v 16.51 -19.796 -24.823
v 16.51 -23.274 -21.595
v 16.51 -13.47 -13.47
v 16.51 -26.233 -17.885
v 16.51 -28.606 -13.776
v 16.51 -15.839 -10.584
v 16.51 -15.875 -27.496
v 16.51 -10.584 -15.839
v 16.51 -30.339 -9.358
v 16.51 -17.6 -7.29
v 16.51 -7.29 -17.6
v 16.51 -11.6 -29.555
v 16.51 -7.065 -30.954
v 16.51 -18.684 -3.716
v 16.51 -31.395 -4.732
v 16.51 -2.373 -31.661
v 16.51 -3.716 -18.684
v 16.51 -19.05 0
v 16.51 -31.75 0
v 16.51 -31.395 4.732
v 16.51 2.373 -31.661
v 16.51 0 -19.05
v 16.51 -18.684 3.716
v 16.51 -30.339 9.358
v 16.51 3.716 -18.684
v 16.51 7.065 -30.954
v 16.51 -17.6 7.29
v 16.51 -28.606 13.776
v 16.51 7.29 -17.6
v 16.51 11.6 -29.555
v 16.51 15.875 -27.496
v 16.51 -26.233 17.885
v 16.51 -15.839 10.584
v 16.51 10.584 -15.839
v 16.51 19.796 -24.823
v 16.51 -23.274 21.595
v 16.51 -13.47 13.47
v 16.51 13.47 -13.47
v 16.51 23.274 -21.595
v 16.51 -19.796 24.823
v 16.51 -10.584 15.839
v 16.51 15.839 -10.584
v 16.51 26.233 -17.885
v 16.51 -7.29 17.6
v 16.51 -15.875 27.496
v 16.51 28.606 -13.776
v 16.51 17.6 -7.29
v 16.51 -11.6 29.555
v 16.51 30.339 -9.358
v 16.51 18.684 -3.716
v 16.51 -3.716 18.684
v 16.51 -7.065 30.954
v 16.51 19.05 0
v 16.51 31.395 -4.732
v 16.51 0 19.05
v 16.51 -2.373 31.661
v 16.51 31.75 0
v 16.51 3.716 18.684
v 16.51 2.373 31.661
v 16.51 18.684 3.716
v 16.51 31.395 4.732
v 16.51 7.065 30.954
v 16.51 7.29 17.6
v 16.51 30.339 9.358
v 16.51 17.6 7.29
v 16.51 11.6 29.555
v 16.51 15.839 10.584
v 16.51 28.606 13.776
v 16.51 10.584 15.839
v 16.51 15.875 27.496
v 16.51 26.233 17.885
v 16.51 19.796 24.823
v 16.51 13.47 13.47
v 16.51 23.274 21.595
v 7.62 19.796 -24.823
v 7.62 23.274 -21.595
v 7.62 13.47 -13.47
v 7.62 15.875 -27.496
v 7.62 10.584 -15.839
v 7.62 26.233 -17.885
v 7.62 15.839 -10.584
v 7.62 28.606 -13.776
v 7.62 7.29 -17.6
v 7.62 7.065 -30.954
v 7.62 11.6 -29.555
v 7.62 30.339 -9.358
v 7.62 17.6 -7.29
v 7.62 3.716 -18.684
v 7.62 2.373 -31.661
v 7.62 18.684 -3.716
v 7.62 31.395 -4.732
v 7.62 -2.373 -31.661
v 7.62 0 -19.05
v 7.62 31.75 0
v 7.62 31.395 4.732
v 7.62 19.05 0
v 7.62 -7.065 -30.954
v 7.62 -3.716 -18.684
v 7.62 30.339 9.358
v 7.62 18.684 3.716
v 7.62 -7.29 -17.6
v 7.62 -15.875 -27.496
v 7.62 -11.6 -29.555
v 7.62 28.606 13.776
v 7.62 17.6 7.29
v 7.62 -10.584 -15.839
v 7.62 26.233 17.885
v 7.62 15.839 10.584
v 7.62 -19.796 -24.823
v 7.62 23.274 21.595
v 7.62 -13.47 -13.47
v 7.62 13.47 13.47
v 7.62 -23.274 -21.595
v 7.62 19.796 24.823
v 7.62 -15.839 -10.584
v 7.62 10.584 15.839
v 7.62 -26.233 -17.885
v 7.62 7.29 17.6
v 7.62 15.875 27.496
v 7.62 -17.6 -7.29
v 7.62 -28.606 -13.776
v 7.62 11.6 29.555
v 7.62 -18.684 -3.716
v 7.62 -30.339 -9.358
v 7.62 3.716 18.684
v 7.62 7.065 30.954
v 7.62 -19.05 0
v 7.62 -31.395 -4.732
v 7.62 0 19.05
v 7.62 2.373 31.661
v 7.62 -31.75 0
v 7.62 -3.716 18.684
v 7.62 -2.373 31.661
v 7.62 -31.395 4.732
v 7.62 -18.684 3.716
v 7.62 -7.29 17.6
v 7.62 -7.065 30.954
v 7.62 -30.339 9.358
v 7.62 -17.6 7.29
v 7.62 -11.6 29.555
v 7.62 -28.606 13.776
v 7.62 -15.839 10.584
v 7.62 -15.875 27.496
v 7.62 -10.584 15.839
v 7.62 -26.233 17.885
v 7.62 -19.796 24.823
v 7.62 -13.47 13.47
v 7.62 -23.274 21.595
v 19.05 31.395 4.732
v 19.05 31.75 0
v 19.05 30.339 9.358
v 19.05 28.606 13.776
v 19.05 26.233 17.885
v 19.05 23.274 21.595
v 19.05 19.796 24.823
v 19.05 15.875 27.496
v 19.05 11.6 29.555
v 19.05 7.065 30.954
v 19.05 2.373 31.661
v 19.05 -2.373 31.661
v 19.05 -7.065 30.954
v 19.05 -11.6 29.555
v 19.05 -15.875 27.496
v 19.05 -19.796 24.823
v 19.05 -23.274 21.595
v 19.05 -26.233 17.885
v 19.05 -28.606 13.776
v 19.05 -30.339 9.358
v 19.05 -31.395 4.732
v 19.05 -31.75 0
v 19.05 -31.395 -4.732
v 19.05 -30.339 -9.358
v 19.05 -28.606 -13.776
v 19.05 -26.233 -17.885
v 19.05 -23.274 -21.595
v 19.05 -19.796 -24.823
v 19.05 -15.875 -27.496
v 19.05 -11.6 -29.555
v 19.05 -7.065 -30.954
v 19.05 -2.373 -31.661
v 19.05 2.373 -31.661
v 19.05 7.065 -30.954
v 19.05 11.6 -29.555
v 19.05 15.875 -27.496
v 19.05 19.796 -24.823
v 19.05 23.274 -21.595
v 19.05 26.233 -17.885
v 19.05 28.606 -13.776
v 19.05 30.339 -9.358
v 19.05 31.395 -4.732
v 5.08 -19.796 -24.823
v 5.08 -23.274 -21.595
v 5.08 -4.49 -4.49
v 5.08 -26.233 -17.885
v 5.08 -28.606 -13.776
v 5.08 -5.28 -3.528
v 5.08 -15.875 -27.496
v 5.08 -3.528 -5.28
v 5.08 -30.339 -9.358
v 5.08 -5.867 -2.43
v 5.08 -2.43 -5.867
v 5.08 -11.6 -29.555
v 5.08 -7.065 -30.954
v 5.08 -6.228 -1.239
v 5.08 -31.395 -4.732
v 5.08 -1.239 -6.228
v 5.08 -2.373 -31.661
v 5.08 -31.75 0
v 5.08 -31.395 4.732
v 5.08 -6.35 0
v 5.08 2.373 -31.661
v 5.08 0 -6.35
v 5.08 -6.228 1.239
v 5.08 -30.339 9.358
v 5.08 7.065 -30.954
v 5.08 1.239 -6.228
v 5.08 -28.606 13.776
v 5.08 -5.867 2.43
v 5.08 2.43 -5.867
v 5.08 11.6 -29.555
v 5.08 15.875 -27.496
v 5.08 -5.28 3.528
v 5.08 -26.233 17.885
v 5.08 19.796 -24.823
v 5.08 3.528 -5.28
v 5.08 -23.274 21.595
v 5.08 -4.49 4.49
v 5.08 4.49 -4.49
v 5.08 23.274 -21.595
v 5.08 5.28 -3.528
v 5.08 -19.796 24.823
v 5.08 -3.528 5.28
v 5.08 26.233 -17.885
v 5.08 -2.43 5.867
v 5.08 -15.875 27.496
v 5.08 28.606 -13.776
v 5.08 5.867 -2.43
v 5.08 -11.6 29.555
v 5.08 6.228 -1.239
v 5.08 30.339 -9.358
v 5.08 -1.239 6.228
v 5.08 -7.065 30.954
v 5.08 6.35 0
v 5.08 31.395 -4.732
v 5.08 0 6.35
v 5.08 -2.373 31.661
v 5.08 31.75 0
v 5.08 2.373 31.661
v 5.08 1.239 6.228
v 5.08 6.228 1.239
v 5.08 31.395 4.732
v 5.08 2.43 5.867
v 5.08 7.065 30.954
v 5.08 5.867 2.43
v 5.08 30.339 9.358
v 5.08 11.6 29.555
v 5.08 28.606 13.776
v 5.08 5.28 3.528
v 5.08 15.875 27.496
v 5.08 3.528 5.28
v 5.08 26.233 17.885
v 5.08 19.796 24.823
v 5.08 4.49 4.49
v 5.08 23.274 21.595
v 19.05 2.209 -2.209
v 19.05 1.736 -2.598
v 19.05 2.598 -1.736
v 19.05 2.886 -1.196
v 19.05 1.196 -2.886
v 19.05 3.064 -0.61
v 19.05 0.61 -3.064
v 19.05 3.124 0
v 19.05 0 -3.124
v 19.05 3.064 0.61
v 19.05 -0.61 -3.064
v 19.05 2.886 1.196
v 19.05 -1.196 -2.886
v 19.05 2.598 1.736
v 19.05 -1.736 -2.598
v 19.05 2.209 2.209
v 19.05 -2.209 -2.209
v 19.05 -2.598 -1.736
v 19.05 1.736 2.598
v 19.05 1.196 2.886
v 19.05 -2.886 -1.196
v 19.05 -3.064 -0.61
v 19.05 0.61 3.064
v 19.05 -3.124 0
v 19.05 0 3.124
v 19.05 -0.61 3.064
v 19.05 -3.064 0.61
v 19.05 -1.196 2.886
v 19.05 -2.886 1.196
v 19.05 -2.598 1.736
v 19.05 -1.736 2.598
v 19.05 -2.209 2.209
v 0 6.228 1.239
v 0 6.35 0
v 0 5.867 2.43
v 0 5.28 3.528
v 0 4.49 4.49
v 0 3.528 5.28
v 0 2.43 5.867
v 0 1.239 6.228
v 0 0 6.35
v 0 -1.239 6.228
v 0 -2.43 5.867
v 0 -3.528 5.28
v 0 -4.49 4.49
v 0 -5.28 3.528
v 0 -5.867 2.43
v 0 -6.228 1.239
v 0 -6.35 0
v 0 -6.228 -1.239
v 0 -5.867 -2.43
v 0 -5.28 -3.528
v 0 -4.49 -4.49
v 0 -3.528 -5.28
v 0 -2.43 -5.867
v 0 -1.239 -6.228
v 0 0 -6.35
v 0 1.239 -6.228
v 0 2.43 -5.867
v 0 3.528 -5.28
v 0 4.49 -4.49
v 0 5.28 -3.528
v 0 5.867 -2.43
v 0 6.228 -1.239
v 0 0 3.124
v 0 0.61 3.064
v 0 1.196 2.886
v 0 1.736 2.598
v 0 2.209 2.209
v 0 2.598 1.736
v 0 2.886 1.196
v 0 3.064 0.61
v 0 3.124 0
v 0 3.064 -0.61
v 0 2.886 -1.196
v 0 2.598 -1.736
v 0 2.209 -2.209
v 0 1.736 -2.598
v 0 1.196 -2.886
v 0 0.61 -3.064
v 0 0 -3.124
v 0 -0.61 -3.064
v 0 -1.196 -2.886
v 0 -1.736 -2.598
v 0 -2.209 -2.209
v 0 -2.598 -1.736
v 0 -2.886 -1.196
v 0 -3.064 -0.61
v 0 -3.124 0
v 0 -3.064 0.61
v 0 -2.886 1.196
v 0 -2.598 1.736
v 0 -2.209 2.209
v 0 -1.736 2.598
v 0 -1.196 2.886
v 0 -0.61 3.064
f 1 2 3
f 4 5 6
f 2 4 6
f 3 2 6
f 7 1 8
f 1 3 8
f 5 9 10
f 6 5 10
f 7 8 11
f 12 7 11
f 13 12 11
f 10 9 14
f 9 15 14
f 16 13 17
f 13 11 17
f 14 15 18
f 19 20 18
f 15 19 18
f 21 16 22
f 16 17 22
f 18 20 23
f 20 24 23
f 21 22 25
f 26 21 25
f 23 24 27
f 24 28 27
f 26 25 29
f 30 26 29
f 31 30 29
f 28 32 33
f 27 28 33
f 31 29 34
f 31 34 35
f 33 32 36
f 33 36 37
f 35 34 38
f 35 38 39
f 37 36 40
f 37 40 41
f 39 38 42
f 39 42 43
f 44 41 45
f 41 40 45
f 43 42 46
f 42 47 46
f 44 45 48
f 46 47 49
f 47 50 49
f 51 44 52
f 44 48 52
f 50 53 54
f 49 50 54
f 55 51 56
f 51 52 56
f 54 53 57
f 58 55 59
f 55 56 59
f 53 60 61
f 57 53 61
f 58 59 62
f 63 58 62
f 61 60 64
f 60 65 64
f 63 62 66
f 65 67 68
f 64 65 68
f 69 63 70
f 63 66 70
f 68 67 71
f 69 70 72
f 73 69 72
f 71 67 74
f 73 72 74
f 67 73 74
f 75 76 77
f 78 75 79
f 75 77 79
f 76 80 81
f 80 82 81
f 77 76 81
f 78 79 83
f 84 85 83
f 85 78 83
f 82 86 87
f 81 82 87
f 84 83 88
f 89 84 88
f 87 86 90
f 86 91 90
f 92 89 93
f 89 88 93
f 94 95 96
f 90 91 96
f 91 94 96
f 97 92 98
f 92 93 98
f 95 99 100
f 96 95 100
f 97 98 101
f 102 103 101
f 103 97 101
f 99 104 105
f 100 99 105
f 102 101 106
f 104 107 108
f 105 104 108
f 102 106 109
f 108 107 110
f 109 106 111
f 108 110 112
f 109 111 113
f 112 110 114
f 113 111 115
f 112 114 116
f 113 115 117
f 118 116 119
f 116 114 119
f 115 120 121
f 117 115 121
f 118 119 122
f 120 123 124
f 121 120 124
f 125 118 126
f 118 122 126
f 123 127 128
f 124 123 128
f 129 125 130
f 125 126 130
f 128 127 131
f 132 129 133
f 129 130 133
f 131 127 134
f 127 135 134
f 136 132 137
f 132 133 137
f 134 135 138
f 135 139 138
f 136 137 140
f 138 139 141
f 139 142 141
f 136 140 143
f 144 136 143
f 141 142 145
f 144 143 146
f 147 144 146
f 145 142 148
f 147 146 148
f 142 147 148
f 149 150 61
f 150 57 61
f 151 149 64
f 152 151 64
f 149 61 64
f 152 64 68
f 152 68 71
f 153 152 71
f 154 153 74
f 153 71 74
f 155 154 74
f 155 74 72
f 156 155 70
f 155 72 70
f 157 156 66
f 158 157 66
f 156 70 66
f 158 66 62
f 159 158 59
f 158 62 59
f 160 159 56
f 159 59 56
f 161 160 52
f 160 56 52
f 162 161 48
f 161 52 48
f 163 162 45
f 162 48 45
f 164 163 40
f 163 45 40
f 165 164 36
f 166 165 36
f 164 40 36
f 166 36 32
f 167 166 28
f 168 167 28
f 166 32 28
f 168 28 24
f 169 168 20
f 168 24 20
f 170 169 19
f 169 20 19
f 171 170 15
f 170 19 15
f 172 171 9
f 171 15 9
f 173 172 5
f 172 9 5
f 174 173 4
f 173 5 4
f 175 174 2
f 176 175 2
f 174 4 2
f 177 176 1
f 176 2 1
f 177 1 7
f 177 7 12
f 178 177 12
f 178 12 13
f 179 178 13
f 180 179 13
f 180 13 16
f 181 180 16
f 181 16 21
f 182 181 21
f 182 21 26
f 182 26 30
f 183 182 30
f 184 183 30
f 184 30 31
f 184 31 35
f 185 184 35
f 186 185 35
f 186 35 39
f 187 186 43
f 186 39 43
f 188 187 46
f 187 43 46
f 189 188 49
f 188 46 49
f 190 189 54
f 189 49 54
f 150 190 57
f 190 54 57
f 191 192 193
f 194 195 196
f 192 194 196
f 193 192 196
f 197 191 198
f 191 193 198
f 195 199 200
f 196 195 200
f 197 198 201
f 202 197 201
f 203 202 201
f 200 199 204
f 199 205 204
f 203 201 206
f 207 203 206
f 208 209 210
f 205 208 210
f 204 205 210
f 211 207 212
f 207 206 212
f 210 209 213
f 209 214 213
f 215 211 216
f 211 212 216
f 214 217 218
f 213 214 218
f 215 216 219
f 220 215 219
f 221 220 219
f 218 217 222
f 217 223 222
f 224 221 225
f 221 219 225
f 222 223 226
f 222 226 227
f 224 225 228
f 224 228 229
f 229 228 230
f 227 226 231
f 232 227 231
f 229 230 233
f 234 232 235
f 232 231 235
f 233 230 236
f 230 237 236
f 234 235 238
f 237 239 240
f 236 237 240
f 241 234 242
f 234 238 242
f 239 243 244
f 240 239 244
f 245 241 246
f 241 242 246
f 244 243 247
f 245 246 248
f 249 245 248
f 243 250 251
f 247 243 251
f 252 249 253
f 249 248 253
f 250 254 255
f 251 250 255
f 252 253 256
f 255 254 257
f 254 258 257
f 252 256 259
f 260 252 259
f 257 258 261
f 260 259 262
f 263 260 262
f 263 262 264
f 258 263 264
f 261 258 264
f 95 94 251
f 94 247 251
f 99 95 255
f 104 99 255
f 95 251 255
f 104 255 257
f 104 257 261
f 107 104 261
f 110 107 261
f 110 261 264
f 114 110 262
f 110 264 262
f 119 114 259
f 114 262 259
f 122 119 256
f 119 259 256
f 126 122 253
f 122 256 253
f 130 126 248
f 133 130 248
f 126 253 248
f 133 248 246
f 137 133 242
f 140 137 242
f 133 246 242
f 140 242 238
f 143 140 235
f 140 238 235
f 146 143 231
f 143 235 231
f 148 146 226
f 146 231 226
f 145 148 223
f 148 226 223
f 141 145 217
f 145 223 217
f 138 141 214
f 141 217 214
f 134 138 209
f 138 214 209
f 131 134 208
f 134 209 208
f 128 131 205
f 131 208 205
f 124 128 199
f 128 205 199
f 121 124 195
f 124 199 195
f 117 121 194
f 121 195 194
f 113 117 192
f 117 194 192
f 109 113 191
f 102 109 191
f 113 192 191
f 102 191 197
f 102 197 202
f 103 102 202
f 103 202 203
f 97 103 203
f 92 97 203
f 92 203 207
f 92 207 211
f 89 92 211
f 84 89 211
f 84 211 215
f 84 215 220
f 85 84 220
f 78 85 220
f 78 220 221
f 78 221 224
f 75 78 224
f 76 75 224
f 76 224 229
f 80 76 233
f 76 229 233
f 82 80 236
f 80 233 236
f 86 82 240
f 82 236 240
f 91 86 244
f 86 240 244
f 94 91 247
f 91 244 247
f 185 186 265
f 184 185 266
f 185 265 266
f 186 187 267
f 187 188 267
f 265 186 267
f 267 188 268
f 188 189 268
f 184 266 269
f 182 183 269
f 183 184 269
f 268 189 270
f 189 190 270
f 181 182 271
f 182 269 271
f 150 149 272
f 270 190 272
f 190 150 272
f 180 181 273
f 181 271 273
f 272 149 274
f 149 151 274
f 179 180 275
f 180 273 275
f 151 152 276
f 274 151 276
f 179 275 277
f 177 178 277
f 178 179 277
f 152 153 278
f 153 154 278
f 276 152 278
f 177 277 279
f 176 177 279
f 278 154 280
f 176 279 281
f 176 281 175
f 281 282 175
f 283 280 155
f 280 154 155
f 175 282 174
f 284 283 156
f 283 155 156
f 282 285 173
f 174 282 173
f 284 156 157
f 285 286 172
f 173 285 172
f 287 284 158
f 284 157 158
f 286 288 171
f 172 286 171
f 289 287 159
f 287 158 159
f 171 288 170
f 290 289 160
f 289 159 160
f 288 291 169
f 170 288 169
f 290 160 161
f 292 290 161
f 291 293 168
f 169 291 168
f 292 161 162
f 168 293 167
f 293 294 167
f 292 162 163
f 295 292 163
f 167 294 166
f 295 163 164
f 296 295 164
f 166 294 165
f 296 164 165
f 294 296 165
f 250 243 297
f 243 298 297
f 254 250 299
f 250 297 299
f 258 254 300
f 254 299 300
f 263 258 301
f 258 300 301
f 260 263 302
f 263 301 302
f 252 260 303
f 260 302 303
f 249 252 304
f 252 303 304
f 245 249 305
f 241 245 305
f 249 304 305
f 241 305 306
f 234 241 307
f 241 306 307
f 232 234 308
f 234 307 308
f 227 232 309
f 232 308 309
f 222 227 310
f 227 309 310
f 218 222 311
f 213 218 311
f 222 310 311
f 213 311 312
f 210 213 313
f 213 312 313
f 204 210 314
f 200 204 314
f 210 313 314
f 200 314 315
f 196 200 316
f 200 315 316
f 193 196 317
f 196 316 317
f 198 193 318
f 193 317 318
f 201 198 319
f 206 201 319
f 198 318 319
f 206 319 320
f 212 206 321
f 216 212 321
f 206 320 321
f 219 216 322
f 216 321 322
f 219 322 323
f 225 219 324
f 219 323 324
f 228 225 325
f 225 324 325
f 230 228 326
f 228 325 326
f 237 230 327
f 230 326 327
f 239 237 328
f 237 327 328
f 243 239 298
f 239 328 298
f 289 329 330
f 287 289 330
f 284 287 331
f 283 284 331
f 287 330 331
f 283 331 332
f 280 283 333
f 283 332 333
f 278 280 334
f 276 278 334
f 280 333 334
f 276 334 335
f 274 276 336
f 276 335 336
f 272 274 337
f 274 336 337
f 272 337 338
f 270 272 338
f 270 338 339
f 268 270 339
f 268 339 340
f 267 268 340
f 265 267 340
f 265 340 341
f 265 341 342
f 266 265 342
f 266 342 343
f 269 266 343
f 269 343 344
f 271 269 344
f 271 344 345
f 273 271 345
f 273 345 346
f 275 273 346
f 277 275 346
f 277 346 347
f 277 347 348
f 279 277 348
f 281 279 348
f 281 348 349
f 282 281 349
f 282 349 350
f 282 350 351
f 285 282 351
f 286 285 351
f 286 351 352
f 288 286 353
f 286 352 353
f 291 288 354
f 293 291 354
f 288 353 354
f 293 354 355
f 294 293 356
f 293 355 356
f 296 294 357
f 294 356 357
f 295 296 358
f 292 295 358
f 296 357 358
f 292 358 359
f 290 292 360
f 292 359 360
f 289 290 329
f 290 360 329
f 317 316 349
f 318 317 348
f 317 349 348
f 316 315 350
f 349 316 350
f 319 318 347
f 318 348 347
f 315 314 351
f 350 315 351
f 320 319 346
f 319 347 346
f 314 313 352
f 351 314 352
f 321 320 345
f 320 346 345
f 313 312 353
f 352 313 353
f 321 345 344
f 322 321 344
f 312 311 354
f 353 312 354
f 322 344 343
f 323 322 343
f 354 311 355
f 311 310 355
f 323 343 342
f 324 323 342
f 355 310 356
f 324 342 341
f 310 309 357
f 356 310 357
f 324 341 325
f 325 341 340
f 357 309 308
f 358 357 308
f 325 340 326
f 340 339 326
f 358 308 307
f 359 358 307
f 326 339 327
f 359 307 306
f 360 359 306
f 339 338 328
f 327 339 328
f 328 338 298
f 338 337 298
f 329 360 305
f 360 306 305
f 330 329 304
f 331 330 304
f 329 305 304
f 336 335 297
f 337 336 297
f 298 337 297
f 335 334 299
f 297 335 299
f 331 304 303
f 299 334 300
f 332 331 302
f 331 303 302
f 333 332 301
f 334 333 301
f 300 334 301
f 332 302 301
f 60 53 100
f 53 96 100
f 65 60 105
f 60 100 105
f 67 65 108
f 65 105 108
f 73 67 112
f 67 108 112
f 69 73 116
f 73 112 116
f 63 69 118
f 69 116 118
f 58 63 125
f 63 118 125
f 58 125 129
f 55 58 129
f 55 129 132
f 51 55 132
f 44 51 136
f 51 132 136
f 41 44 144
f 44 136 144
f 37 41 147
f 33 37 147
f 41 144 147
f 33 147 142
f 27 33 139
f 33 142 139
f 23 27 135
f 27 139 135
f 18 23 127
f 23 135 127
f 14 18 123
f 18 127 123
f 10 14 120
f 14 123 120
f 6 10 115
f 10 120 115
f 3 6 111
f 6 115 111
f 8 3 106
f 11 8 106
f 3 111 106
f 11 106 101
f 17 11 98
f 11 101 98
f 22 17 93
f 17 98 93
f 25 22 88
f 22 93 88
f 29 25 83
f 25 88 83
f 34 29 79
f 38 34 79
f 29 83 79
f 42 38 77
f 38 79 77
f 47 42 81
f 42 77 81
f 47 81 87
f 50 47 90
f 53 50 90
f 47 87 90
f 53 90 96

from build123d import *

# Parameters (mm, degrees)
SKETCH2_R          = 3.1242
CUT_EXTRUDE1_DEPTH = 20.05


with BuildPart() as part:
    # Sketch1 → Revolve1 (revolve)
    with BuildSketch(Plane.XY):
        Polygon((0, 0), (19.05, 0), (19.05, 31.75), (16.51, 31.75), (16.51, 19.05), (7.62, 19.05), (7.62, 31.75), (5.08, 31.75), (5.08, 6.35), (0, 6.35), align=None)
    revolve(axis=Axis((0, 0, 0), (1, 0, 0)))

    # Sketch2 → Cut-Extrude1 (cut, through all)
    with BuildSketch(Plane.ZY):
        Circle(SKETCH2_R)
    extrude(amount=-CUT_EXTRUDE1_DEPTH, mode=Mode.SUBTRACT)


solid = part.part
